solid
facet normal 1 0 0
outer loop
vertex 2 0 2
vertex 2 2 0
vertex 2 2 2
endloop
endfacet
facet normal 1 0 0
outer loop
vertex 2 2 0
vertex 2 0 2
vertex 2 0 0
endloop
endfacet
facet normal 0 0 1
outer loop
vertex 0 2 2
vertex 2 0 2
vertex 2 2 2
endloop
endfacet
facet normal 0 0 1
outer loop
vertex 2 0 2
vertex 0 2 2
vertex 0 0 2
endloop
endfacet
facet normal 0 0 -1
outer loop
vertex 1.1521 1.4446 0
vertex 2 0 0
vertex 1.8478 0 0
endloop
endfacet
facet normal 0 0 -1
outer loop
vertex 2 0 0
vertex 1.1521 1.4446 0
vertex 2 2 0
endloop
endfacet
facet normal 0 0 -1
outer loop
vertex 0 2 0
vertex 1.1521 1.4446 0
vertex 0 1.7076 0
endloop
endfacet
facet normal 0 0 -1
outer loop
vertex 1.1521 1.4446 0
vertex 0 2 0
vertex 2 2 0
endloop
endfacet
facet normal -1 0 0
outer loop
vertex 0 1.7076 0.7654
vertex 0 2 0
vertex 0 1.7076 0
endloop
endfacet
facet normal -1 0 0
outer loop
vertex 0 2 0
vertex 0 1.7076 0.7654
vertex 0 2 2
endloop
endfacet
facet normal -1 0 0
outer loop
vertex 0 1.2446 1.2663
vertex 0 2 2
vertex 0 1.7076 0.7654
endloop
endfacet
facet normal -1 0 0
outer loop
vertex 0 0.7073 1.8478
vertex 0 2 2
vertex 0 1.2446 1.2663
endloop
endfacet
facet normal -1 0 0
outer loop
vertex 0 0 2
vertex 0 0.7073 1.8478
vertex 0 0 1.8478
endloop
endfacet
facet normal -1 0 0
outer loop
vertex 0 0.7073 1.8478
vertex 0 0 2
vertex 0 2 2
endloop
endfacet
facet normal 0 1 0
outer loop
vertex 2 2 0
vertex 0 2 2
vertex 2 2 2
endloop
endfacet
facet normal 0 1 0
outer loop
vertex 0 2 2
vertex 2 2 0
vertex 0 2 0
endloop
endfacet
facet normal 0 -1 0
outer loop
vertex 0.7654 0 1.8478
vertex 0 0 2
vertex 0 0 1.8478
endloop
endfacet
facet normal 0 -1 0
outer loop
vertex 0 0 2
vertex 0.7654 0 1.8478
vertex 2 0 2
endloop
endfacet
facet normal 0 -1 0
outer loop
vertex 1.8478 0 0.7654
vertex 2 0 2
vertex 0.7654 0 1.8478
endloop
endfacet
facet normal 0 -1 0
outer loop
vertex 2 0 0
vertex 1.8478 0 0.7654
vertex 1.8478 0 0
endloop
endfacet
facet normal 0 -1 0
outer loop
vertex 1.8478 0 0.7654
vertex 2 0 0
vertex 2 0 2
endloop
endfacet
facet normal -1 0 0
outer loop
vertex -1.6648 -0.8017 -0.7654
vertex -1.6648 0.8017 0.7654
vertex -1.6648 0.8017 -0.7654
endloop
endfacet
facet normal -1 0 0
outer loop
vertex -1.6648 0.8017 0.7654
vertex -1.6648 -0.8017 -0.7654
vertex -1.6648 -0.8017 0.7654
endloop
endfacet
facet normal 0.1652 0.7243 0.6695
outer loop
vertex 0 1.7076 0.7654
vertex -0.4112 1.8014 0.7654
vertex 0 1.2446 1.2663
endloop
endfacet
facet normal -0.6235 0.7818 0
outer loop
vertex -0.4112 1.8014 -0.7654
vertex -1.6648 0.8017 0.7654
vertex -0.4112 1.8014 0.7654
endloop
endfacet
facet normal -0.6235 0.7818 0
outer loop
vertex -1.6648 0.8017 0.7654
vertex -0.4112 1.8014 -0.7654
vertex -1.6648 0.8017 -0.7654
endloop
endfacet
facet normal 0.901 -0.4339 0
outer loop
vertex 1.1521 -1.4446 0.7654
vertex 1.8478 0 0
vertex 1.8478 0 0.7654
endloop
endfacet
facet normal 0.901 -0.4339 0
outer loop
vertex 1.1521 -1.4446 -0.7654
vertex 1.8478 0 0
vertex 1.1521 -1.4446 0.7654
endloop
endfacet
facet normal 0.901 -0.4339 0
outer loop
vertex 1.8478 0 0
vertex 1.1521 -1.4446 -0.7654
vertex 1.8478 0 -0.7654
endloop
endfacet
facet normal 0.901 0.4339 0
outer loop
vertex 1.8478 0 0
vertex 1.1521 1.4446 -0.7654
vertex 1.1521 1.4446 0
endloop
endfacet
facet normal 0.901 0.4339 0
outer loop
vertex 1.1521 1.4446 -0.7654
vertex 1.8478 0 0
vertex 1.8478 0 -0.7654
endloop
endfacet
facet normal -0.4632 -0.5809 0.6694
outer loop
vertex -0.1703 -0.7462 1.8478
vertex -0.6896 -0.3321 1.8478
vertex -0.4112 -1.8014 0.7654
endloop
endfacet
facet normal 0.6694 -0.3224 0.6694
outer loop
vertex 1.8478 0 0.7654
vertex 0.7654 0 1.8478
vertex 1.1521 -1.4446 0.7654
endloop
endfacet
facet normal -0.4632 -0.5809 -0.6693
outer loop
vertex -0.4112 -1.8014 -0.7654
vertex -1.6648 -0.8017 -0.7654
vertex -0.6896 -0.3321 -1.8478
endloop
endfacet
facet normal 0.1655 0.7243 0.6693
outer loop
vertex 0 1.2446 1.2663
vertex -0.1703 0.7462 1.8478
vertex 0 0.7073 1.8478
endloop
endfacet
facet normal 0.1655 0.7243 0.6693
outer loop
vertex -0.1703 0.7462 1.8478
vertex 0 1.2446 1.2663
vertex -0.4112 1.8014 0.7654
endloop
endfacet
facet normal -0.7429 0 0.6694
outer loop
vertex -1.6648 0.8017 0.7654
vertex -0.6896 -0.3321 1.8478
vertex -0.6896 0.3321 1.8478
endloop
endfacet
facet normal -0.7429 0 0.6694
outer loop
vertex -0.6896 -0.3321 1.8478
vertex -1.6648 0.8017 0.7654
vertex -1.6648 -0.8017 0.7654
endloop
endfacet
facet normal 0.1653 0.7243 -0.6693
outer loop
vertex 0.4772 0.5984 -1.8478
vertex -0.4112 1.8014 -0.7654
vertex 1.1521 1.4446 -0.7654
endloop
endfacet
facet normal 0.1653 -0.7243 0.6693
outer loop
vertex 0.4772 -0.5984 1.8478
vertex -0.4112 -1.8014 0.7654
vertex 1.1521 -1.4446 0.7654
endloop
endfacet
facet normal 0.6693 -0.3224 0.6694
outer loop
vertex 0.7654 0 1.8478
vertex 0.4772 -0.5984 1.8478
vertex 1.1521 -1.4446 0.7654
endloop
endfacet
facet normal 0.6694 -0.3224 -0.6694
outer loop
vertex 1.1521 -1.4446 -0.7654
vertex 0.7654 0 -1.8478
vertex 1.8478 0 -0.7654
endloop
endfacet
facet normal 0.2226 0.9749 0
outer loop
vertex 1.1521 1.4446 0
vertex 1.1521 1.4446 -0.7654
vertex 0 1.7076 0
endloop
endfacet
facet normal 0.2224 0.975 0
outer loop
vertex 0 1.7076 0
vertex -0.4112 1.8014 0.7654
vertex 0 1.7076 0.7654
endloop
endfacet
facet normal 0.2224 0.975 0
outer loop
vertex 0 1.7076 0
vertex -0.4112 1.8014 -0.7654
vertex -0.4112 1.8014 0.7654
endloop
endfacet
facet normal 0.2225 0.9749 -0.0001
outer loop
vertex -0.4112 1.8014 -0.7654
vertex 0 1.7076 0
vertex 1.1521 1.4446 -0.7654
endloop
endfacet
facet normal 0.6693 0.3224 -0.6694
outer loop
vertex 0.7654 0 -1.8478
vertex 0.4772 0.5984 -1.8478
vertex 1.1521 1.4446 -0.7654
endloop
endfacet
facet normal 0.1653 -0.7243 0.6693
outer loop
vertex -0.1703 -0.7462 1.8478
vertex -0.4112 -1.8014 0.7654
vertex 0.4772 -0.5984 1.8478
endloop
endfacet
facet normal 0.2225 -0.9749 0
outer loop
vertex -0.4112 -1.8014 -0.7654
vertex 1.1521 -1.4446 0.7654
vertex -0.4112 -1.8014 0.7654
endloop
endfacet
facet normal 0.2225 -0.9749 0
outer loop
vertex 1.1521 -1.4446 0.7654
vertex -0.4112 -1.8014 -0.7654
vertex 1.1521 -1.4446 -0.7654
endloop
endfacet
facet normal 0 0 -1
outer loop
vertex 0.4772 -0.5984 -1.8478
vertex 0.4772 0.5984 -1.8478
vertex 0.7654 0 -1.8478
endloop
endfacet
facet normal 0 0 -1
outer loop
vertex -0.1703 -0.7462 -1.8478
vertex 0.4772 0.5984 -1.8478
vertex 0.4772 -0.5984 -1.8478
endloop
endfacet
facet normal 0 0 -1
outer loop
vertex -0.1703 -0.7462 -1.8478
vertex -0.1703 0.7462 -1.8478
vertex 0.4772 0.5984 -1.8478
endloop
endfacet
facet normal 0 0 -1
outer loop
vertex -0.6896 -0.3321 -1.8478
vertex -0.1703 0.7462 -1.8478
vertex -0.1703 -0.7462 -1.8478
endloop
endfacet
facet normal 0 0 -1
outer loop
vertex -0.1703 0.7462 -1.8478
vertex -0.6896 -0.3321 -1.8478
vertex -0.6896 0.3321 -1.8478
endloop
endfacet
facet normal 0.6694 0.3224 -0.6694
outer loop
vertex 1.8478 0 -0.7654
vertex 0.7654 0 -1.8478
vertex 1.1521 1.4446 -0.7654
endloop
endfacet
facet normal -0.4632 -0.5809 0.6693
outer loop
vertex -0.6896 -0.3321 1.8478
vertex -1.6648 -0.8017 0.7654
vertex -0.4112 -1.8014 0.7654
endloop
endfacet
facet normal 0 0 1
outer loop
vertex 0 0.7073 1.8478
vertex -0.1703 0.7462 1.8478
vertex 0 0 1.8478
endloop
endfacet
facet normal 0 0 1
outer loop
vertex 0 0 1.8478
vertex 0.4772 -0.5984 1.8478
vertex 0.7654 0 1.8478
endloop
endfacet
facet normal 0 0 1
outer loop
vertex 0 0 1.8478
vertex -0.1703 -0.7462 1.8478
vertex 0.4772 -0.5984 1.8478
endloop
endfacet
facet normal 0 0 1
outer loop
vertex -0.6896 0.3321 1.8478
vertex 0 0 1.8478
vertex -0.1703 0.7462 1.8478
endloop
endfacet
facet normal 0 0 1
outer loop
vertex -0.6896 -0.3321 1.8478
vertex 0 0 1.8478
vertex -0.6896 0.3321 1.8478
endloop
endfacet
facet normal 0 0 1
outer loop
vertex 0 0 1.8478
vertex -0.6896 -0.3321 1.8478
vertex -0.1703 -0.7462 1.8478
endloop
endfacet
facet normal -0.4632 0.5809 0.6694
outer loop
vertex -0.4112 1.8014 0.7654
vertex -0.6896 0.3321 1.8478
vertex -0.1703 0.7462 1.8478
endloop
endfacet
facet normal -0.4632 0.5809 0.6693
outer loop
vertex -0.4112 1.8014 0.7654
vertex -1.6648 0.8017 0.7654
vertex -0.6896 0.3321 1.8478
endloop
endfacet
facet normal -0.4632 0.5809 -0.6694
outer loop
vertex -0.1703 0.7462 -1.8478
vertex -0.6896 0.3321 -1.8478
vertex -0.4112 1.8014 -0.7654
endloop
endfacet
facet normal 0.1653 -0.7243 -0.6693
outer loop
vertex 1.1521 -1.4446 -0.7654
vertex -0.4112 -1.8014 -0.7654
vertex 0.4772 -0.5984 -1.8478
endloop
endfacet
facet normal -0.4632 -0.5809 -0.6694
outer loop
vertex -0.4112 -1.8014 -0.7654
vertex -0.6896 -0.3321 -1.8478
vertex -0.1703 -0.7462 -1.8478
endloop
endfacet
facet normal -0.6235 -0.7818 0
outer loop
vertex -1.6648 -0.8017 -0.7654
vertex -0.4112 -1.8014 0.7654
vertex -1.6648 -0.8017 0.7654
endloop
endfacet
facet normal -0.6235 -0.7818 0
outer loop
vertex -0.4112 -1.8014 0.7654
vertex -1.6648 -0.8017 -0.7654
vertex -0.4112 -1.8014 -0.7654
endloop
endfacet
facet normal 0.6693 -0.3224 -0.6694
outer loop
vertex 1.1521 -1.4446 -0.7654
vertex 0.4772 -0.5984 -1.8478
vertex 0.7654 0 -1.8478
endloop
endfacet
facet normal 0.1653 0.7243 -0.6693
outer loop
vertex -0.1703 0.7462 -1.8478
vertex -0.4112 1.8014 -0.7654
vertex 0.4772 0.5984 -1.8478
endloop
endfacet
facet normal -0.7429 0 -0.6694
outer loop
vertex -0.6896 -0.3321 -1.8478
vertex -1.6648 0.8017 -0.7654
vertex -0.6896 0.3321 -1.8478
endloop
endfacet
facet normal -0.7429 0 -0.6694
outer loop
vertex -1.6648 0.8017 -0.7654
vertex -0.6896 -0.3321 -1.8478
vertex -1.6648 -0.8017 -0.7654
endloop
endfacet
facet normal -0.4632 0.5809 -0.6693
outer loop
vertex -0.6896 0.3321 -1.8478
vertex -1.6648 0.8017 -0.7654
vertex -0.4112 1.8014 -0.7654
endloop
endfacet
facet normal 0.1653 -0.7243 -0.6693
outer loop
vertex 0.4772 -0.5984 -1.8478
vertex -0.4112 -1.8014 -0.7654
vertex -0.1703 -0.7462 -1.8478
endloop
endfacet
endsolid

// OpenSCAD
let (a = 1) cube(a);
echo("x") cube();
assert(true) cube();
let (a = 2) { cube(a); sphere(a); }
